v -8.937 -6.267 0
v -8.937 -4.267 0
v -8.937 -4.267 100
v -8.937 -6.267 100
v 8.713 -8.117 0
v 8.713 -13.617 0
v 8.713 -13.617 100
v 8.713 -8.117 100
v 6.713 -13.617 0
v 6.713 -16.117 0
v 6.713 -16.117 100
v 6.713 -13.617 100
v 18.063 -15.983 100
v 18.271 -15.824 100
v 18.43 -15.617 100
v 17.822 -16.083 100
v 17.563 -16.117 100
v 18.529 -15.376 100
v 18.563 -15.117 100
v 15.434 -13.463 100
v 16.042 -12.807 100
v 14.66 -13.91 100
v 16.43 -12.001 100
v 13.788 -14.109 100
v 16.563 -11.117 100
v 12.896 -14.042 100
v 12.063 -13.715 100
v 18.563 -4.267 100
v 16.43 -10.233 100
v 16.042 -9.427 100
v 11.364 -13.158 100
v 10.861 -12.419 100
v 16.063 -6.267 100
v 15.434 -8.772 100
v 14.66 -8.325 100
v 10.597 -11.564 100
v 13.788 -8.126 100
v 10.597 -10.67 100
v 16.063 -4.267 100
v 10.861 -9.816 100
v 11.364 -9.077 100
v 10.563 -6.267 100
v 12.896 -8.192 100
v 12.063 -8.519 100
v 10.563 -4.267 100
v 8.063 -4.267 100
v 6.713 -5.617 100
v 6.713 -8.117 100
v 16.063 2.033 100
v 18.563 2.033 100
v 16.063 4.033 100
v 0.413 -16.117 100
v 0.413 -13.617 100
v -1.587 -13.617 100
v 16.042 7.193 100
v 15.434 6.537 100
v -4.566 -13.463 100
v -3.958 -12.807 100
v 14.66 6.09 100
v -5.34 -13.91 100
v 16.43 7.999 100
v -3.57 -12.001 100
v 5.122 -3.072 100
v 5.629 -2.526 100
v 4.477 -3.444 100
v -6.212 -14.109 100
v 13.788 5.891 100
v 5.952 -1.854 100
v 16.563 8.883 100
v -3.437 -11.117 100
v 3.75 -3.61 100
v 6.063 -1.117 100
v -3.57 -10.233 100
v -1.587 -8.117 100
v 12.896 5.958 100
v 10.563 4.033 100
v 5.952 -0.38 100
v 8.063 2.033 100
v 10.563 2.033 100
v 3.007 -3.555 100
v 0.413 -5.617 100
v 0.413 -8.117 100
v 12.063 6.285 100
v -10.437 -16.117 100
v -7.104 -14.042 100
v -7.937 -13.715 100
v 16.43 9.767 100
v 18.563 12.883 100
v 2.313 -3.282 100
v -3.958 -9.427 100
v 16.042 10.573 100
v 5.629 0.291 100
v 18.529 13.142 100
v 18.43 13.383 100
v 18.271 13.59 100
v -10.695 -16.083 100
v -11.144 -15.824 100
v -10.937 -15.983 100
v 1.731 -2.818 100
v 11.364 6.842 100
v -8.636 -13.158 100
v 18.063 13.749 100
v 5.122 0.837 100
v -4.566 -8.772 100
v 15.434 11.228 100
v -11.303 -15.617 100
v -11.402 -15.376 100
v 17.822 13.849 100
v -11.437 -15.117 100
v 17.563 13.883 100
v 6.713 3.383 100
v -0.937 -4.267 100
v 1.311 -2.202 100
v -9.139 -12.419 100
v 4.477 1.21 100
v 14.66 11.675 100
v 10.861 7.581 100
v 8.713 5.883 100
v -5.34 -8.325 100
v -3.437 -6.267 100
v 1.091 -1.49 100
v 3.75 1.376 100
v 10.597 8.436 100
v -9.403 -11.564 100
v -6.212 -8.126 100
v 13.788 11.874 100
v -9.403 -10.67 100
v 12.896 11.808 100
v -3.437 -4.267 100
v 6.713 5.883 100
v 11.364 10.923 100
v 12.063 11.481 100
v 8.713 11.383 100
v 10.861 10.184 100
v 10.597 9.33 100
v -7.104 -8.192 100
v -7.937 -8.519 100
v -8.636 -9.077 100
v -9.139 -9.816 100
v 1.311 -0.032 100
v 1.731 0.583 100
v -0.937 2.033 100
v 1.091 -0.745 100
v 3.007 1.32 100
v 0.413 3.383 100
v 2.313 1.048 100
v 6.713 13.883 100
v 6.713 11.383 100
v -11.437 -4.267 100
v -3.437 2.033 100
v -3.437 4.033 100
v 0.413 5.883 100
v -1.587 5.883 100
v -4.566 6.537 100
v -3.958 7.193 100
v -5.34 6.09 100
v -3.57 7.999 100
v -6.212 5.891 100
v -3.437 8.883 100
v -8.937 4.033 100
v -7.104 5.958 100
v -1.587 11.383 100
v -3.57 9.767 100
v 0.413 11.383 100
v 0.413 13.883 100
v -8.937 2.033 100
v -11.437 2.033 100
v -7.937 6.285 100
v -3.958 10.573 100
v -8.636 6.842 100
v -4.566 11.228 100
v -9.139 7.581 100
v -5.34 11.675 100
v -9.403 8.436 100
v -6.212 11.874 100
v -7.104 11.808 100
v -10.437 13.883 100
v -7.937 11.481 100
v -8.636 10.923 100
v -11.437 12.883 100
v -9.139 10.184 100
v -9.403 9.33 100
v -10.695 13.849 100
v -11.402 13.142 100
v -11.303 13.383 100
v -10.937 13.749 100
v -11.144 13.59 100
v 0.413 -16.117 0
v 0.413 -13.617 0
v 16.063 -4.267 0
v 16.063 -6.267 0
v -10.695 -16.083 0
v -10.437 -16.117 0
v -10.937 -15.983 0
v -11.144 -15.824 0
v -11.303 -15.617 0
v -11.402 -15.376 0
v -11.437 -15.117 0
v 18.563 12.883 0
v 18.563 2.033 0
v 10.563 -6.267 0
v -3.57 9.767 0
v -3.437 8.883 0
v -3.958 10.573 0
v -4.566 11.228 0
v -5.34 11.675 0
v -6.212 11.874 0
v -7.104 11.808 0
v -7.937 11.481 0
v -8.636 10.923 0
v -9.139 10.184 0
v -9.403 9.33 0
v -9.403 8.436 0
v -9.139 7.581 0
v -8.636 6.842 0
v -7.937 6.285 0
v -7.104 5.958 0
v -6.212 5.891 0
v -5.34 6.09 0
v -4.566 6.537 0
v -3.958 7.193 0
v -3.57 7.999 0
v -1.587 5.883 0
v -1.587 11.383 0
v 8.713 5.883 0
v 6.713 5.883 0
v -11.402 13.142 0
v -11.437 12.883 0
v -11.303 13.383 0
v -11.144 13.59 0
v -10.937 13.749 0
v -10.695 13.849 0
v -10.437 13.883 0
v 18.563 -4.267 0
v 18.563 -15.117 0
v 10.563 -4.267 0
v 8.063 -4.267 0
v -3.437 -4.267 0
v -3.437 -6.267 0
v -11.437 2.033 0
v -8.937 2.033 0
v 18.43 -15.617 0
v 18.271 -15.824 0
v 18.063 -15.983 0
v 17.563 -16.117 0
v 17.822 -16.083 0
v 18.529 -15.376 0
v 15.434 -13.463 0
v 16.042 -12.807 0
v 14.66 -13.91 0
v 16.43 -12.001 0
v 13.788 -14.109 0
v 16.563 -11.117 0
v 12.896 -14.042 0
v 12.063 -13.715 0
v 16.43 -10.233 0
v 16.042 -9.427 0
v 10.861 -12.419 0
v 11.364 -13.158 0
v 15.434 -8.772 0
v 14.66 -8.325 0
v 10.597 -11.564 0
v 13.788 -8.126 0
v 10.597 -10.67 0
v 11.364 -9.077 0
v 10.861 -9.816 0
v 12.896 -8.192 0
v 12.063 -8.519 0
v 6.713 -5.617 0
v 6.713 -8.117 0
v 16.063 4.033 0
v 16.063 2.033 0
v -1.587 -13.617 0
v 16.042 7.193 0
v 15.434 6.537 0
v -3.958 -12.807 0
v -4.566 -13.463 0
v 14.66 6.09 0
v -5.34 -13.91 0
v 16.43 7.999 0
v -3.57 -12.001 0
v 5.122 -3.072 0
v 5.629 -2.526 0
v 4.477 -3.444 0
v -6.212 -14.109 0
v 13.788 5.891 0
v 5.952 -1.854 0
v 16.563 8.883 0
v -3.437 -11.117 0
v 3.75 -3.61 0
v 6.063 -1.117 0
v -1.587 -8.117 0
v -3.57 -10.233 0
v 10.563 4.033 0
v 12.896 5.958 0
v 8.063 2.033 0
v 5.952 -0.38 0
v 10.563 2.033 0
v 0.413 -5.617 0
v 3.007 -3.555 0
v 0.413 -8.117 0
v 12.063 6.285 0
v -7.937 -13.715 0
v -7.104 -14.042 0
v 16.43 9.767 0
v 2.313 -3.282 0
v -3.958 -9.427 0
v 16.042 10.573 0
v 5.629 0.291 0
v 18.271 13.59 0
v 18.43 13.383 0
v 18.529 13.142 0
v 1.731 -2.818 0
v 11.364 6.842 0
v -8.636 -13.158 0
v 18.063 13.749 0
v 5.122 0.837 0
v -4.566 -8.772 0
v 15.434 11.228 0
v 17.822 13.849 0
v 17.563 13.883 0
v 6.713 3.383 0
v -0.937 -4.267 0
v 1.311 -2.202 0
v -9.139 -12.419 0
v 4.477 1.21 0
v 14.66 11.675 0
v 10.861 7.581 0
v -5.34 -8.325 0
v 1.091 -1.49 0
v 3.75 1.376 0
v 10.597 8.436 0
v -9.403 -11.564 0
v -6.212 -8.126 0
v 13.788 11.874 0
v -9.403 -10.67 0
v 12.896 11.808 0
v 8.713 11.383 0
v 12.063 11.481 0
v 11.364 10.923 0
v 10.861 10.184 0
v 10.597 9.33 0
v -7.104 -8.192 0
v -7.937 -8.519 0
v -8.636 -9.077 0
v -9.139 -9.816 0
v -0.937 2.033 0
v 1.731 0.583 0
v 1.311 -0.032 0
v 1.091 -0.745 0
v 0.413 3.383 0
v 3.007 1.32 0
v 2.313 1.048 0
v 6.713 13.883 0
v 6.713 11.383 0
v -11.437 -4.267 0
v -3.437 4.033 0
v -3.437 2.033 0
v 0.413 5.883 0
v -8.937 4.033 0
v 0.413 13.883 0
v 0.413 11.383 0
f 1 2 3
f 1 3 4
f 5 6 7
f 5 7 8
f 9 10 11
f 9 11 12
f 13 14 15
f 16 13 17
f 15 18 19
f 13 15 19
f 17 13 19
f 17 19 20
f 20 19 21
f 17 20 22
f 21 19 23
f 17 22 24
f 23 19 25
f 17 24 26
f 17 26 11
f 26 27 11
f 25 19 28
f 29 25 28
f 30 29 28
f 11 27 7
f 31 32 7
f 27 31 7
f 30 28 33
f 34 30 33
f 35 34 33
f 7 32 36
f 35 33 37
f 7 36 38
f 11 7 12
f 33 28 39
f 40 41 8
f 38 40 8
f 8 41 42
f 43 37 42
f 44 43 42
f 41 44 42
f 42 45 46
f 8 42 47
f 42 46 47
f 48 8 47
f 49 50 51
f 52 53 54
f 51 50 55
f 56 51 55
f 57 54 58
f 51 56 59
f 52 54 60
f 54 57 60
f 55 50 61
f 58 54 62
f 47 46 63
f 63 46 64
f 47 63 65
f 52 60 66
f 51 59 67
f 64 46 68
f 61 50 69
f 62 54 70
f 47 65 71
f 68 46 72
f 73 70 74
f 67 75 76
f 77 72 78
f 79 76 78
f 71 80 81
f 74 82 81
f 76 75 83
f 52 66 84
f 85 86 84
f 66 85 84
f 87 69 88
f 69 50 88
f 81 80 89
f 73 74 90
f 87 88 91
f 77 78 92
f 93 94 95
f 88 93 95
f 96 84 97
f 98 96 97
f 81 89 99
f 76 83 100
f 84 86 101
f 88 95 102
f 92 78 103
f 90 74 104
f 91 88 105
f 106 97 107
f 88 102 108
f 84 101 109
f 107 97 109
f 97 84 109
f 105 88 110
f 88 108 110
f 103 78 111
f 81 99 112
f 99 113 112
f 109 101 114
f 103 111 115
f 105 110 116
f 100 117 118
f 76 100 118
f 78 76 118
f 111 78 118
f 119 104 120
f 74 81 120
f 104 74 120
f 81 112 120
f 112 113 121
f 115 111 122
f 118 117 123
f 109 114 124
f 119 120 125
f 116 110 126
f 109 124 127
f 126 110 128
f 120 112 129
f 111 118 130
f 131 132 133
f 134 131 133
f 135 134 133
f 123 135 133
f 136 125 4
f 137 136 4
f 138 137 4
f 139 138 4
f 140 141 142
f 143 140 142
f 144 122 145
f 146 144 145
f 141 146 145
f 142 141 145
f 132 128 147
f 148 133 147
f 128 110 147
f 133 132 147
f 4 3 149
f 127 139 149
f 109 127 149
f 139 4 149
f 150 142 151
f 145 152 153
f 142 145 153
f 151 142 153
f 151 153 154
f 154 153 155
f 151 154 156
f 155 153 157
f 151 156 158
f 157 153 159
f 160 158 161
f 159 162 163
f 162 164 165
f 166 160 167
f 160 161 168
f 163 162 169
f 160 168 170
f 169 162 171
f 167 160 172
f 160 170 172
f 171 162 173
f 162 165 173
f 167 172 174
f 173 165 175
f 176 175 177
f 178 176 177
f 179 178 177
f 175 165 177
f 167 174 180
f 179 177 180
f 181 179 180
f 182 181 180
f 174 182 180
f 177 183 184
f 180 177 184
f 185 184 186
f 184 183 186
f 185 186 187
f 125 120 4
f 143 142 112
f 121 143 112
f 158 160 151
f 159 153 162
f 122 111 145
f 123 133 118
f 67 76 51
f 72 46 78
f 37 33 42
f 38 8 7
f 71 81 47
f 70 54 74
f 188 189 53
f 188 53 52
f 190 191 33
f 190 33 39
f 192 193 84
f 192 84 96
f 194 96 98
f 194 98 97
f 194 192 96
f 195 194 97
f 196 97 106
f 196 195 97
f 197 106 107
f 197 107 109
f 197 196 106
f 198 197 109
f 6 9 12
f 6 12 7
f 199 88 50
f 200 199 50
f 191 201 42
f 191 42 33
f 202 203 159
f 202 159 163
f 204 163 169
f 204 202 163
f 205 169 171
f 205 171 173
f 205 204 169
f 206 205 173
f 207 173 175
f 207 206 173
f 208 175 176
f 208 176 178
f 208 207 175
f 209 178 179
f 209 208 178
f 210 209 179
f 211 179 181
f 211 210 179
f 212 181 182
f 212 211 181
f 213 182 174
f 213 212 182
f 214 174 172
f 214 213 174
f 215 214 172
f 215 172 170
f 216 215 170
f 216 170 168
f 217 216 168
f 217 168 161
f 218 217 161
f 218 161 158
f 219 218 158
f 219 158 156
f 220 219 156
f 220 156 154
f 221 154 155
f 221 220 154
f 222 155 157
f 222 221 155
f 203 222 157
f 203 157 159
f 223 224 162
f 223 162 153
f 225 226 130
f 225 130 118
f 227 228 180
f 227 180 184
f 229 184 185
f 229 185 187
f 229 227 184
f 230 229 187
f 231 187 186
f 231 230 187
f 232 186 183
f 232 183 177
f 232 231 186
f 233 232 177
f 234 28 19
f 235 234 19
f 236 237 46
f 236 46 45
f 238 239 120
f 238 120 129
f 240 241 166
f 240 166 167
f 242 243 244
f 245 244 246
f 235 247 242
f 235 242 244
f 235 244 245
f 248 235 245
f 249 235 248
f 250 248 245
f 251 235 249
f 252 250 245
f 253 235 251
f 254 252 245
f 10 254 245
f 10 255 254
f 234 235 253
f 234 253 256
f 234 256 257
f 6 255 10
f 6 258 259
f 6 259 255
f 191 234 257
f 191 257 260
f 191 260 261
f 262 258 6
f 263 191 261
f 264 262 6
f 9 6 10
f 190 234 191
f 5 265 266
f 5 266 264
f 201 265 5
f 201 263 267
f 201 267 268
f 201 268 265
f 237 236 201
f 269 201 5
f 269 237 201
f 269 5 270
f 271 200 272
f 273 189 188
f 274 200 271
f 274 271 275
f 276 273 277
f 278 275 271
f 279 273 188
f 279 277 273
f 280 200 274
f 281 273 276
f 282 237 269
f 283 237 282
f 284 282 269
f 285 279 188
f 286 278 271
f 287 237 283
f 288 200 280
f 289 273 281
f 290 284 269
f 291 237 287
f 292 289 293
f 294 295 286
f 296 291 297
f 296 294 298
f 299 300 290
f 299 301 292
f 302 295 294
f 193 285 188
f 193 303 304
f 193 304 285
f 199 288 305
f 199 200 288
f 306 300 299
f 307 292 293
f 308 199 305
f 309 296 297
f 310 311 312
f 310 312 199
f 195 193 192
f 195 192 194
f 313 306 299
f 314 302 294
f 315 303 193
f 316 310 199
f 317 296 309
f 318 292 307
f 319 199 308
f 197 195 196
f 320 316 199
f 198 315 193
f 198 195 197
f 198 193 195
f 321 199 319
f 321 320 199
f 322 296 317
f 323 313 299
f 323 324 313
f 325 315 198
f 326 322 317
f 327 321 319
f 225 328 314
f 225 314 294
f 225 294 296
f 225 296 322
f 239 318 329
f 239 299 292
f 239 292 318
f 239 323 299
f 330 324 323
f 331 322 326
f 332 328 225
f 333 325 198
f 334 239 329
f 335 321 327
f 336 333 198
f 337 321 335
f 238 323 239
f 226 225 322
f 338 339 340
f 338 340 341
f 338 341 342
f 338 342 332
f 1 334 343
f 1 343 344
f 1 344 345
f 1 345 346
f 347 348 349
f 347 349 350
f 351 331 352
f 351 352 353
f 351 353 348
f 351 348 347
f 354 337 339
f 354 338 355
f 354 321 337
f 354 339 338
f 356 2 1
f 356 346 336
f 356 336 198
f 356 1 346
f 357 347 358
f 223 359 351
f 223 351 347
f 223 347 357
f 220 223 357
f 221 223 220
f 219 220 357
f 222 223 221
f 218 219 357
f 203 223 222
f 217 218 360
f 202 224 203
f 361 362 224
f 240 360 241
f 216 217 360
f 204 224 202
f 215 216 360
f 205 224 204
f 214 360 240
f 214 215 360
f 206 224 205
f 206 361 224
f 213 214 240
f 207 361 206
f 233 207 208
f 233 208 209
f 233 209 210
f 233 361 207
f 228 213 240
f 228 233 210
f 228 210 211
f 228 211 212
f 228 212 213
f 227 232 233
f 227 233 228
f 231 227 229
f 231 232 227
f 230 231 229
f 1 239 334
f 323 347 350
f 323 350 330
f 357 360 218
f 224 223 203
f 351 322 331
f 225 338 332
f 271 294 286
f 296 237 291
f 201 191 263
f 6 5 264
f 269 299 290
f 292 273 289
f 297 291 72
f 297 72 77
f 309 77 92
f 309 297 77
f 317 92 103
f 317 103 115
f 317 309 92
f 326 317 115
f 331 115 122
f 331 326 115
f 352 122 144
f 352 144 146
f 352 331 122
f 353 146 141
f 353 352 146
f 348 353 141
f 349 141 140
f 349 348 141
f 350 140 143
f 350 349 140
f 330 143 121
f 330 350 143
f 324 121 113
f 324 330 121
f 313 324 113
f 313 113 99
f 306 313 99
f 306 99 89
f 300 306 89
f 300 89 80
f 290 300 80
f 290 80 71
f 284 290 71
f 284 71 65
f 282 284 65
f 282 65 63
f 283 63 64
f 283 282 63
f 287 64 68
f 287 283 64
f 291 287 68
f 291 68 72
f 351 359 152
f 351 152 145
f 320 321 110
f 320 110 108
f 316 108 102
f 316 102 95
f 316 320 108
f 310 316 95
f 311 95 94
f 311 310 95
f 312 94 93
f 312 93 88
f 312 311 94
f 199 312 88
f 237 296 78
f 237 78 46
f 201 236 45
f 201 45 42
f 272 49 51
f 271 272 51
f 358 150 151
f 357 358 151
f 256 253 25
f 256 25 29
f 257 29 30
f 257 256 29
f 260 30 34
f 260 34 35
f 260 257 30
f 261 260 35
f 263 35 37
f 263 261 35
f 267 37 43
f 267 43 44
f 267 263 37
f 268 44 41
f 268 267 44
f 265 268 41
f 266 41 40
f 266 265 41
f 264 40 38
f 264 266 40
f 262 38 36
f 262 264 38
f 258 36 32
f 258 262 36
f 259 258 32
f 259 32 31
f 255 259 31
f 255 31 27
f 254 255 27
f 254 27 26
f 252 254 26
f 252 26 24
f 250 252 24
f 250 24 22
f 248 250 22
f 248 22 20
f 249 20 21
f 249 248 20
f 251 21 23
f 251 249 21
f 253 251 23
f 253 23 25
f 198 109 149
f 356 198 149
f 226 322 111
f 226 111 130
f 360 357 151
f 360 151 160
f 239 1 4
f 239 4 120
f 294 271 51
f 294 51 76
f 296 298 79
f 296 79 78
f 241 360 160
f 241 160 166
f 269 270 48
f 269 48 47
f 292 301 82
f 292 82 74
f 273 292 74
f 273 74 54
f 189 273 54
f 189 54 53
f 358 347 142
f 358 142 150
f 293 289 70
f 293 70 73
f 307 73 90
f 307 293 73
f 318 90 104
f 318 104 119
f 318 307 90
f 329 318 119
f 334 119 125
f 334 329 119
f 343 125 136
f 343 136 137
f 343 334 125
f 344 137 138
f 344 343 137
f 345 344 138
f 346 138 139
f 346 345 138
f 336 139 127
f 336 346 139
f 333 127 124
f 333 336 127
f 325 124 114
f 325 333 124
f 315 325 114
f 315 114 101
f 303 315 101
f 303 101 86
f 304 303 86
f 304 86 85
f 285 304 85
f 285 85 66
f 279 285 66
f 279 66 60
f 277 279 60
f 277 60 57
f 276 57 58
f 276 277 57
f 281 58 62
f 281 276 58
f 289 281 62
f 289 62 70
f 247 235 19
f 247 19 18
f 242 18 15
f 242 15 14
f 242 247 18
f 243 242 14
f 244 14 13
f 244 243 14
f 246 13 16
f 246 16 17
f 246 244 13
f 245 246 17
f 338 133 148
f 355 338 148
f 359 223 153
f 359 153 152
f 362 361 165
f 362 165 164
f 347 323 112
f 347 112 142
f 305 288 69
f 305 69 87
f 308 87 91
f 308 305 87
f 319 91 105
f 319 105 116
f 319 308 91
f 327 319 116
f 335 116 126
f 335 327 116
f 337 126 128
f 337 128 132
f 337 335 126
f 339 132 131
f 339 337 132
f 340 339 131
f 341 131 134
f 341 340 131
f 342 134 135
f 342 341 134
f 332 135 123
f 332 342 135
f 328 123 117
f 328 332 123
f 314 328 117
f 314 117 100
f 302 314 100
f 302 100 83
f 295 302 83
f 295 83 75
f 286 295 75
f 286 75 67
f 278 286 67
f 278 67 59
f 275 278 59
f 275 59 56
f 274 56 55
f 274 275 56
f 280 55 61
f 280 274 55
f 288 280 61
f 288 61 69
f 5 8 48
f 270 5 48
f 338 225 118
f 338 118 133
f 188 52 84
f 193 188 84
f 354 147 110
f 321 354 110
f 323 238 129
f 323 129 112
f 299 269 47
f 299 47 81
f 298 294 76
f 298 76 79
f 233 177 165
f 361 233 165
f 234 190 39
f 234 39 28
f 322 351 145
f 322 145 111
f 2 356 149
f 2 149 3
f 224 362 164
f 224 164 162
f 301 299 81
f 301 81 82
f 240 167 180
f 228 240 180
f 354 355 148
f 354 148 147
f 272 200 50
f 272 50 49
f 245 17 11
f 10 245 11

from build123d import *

# Parameters (mm, degrees)
SKETCH_1_R      = 3
SKETCH_1_R_2    = 2.5
EXTRUDE_1_DEPTH = 100


with BuildPart() as part:
    # 草图1 → 凸台-拉伸1 (new body)
    with BuildSketch(Plane.XY):
        with BuildLine():
            Line((-11.436512183, -15.117205795), (-11.436512183, -4.267205795))
            Line((-11.436512183, -4.267205795), (-8.936512183, -4.267205795))
            Line((-8.936512183, -4.267205795), (-8.936512183, -6.267205795))
            Line((-8.936512183, -6.267205795), (-3.436512183, -6.267205795))
            Line((-3.436512183, -6.267205795), (-3.436512183, -4.267205795))
            Line((-3.436512183, -4.267205795), (-0.936512183, -4.267205795))
            Line((-0.936512183, -4.267205795), (-0.936512183, 2.032794205))
            Line((-0.936512183, 2.032794205), (-3.436512183, 2.032794205))
            Line((-3.436512183, 2.032794205), (-3.436512183, 4.032794205))
            Line((-3.436512183, 4.032794205), (-8.936512183, 4.032794205))
            Line((-8.936512183, 4.032794205), (-8.936512183, 2.032794205))
            Line((-8.936512183, 2.032794205), (-11.436512183, 2.032794205))
            Line((-11.436512183, 2.032794205), (-11.436512183, 12.882794205))
            ThreePointArc((-11.436512183, 12.882794205), (-11.143618964, 13.589900986), (-10.436512183, 13.882794205))
            Line((-10.436512183, 13.882794205), (0.413487817, 13.882794205))
            Line((0.413487817, 13.882794205), (0.413487817, 11.382794205))
            Line((0.413487817, 11.382794205), (-1.586512183, 11.382794205))
            Line((-1.586512183, 11.382794205), (-1.586512183, 5.882794205))
            Line((-1.586512183, 5.882794205), (0.413487817, 5.882794205))
            Line((0.413487817, 5.882794205), (0.413487817, 3.382794205))
            Line((0.413487817, 3.382794205), (6.713487817, 3.382794205))
            Line((6.713487817, 3.382794205), (6.713487817, 5.882794205))
            Line((6.713487817, 5.882794205), (8.713487817, 5.882794205))
            Line((8.713487817, 5.882794205), (8.713487817, 11.382794205))
            Line((8.713487817, 11.382794205), (6.713487817, 11.382794205))
            Line((6.713487817, 11.382794205), (6.713487817, 13.882794205))
            Line((6.713487817, 13.882794205), (17.563487817, 13.882794205))
            ThreePointArc((17.563487817, 13.882794205), (18.270594598, 13.589900986), (18.563487817, 12.882794205))
            Line((18.563487817, 12.882794205), (18.563487817, 2.032794205))
            Line((18.563487817, 2.032794205), (16.063487817, 2.032794205))
            Line((16.063487817, 2.032794205), (16.063487817, 4.032794205))
            Line((16.063487817, 4.032794205), (10.563487817, 4.032794205))
            Line((10.563487817, 4.032794205), (10.563487817, 2.032794205))
            Line((10.563487817, 2.032794205), (8.063487817, 2.032794205))
            Line((8.063487817, 2.032794205), (8.063487817, -4.267205795))
            Line((8.063487817, -4.267205795), (10.563487817, -4.267205795))
            Line((10.563487817, -4.267205795), (10.563487817, -6.267205795))
            Line((10.563487817, -6.267205795), (16.063487817, -6.267205795))
            Line((16.063487817, -6.267205795), (16.063487817, -4.267205795))
            Line((16.063487817, -4.267205795), (18.563487817, -4.267205795))
            Line((18.563487817, -4.267205795), (18.563487817, -15.117205795))
            ThreePointArc((18.563487817, -15.117205795), (18.270594598, -15.824312576), (17.563487817, -16.117205795))
            Line((17.563487817, -16.117205795), (6.713487817, -16.117205795))
            Line((6.713487817, -16.117205795), (6.713487817, -13.617205795))
            Line((6.713487817, -13.617205795), (8.713487817, -13.617205795))
            Line((8.713487817, -13.617205795), (8.713487817, -8.117205795))
            Line((8.713487817, -8.117205795), (6.713487817, -8.117205795))
            Line((6.713487817, -8.117205795), (6.713487817, -5.617205795))
            Line((6.713487817, -5.617205795), (0.413487817, -5.617205795))
            Line((0.413487817, -5.617205795), (0.413487817, -8.117205795))
            Line((0.413487817, -8.117205795), (-1.586512183, -8.117205795))
            Line((-1.586512183, -8.117205795), (-1.586512183, -13.617205795))
            Line((-1.586512183, -13.617205795), (0.413487817, -13.617205795))
            Line((0.413487817, -13.617205795), (0.413487817, -16.117205795))
            Line((0.413487817, -16.117205795), (-10.436512183, -16.117205795))
            ThreePointArc((-10.436512183, -16.117205795), (-11.143618964, -15.824312576), (-11.436512183, -15.117205795))
        make_face()
        with Locations((-6.436512183, 8.882794205)):
            Circle(SKETCH_1_R, mode=Mode.SUBTRACT)
        with Locations((-6.436512183, -11.117205795)):
            Circle(SKETCH_1_R, mode=Mode.SUBTRACT)
        with Locations((13.563487817, -11.117205795)):
            Circle(SKETCH_1_R, mode=Mode.SUBTRACT)
        with Locations((13.563487817, 8.882794205)):
            Circle(SKETCH_1_R, mode=Mode.SUBTRACT)
        with Locations((3.563487817, -1.117205795)):
            Circle(SKETCH_1_R_2, mode=Mode.SUBTRACT)
    extrude(amount=EXTRUDE_1_DEPTH)


solid = part.part
